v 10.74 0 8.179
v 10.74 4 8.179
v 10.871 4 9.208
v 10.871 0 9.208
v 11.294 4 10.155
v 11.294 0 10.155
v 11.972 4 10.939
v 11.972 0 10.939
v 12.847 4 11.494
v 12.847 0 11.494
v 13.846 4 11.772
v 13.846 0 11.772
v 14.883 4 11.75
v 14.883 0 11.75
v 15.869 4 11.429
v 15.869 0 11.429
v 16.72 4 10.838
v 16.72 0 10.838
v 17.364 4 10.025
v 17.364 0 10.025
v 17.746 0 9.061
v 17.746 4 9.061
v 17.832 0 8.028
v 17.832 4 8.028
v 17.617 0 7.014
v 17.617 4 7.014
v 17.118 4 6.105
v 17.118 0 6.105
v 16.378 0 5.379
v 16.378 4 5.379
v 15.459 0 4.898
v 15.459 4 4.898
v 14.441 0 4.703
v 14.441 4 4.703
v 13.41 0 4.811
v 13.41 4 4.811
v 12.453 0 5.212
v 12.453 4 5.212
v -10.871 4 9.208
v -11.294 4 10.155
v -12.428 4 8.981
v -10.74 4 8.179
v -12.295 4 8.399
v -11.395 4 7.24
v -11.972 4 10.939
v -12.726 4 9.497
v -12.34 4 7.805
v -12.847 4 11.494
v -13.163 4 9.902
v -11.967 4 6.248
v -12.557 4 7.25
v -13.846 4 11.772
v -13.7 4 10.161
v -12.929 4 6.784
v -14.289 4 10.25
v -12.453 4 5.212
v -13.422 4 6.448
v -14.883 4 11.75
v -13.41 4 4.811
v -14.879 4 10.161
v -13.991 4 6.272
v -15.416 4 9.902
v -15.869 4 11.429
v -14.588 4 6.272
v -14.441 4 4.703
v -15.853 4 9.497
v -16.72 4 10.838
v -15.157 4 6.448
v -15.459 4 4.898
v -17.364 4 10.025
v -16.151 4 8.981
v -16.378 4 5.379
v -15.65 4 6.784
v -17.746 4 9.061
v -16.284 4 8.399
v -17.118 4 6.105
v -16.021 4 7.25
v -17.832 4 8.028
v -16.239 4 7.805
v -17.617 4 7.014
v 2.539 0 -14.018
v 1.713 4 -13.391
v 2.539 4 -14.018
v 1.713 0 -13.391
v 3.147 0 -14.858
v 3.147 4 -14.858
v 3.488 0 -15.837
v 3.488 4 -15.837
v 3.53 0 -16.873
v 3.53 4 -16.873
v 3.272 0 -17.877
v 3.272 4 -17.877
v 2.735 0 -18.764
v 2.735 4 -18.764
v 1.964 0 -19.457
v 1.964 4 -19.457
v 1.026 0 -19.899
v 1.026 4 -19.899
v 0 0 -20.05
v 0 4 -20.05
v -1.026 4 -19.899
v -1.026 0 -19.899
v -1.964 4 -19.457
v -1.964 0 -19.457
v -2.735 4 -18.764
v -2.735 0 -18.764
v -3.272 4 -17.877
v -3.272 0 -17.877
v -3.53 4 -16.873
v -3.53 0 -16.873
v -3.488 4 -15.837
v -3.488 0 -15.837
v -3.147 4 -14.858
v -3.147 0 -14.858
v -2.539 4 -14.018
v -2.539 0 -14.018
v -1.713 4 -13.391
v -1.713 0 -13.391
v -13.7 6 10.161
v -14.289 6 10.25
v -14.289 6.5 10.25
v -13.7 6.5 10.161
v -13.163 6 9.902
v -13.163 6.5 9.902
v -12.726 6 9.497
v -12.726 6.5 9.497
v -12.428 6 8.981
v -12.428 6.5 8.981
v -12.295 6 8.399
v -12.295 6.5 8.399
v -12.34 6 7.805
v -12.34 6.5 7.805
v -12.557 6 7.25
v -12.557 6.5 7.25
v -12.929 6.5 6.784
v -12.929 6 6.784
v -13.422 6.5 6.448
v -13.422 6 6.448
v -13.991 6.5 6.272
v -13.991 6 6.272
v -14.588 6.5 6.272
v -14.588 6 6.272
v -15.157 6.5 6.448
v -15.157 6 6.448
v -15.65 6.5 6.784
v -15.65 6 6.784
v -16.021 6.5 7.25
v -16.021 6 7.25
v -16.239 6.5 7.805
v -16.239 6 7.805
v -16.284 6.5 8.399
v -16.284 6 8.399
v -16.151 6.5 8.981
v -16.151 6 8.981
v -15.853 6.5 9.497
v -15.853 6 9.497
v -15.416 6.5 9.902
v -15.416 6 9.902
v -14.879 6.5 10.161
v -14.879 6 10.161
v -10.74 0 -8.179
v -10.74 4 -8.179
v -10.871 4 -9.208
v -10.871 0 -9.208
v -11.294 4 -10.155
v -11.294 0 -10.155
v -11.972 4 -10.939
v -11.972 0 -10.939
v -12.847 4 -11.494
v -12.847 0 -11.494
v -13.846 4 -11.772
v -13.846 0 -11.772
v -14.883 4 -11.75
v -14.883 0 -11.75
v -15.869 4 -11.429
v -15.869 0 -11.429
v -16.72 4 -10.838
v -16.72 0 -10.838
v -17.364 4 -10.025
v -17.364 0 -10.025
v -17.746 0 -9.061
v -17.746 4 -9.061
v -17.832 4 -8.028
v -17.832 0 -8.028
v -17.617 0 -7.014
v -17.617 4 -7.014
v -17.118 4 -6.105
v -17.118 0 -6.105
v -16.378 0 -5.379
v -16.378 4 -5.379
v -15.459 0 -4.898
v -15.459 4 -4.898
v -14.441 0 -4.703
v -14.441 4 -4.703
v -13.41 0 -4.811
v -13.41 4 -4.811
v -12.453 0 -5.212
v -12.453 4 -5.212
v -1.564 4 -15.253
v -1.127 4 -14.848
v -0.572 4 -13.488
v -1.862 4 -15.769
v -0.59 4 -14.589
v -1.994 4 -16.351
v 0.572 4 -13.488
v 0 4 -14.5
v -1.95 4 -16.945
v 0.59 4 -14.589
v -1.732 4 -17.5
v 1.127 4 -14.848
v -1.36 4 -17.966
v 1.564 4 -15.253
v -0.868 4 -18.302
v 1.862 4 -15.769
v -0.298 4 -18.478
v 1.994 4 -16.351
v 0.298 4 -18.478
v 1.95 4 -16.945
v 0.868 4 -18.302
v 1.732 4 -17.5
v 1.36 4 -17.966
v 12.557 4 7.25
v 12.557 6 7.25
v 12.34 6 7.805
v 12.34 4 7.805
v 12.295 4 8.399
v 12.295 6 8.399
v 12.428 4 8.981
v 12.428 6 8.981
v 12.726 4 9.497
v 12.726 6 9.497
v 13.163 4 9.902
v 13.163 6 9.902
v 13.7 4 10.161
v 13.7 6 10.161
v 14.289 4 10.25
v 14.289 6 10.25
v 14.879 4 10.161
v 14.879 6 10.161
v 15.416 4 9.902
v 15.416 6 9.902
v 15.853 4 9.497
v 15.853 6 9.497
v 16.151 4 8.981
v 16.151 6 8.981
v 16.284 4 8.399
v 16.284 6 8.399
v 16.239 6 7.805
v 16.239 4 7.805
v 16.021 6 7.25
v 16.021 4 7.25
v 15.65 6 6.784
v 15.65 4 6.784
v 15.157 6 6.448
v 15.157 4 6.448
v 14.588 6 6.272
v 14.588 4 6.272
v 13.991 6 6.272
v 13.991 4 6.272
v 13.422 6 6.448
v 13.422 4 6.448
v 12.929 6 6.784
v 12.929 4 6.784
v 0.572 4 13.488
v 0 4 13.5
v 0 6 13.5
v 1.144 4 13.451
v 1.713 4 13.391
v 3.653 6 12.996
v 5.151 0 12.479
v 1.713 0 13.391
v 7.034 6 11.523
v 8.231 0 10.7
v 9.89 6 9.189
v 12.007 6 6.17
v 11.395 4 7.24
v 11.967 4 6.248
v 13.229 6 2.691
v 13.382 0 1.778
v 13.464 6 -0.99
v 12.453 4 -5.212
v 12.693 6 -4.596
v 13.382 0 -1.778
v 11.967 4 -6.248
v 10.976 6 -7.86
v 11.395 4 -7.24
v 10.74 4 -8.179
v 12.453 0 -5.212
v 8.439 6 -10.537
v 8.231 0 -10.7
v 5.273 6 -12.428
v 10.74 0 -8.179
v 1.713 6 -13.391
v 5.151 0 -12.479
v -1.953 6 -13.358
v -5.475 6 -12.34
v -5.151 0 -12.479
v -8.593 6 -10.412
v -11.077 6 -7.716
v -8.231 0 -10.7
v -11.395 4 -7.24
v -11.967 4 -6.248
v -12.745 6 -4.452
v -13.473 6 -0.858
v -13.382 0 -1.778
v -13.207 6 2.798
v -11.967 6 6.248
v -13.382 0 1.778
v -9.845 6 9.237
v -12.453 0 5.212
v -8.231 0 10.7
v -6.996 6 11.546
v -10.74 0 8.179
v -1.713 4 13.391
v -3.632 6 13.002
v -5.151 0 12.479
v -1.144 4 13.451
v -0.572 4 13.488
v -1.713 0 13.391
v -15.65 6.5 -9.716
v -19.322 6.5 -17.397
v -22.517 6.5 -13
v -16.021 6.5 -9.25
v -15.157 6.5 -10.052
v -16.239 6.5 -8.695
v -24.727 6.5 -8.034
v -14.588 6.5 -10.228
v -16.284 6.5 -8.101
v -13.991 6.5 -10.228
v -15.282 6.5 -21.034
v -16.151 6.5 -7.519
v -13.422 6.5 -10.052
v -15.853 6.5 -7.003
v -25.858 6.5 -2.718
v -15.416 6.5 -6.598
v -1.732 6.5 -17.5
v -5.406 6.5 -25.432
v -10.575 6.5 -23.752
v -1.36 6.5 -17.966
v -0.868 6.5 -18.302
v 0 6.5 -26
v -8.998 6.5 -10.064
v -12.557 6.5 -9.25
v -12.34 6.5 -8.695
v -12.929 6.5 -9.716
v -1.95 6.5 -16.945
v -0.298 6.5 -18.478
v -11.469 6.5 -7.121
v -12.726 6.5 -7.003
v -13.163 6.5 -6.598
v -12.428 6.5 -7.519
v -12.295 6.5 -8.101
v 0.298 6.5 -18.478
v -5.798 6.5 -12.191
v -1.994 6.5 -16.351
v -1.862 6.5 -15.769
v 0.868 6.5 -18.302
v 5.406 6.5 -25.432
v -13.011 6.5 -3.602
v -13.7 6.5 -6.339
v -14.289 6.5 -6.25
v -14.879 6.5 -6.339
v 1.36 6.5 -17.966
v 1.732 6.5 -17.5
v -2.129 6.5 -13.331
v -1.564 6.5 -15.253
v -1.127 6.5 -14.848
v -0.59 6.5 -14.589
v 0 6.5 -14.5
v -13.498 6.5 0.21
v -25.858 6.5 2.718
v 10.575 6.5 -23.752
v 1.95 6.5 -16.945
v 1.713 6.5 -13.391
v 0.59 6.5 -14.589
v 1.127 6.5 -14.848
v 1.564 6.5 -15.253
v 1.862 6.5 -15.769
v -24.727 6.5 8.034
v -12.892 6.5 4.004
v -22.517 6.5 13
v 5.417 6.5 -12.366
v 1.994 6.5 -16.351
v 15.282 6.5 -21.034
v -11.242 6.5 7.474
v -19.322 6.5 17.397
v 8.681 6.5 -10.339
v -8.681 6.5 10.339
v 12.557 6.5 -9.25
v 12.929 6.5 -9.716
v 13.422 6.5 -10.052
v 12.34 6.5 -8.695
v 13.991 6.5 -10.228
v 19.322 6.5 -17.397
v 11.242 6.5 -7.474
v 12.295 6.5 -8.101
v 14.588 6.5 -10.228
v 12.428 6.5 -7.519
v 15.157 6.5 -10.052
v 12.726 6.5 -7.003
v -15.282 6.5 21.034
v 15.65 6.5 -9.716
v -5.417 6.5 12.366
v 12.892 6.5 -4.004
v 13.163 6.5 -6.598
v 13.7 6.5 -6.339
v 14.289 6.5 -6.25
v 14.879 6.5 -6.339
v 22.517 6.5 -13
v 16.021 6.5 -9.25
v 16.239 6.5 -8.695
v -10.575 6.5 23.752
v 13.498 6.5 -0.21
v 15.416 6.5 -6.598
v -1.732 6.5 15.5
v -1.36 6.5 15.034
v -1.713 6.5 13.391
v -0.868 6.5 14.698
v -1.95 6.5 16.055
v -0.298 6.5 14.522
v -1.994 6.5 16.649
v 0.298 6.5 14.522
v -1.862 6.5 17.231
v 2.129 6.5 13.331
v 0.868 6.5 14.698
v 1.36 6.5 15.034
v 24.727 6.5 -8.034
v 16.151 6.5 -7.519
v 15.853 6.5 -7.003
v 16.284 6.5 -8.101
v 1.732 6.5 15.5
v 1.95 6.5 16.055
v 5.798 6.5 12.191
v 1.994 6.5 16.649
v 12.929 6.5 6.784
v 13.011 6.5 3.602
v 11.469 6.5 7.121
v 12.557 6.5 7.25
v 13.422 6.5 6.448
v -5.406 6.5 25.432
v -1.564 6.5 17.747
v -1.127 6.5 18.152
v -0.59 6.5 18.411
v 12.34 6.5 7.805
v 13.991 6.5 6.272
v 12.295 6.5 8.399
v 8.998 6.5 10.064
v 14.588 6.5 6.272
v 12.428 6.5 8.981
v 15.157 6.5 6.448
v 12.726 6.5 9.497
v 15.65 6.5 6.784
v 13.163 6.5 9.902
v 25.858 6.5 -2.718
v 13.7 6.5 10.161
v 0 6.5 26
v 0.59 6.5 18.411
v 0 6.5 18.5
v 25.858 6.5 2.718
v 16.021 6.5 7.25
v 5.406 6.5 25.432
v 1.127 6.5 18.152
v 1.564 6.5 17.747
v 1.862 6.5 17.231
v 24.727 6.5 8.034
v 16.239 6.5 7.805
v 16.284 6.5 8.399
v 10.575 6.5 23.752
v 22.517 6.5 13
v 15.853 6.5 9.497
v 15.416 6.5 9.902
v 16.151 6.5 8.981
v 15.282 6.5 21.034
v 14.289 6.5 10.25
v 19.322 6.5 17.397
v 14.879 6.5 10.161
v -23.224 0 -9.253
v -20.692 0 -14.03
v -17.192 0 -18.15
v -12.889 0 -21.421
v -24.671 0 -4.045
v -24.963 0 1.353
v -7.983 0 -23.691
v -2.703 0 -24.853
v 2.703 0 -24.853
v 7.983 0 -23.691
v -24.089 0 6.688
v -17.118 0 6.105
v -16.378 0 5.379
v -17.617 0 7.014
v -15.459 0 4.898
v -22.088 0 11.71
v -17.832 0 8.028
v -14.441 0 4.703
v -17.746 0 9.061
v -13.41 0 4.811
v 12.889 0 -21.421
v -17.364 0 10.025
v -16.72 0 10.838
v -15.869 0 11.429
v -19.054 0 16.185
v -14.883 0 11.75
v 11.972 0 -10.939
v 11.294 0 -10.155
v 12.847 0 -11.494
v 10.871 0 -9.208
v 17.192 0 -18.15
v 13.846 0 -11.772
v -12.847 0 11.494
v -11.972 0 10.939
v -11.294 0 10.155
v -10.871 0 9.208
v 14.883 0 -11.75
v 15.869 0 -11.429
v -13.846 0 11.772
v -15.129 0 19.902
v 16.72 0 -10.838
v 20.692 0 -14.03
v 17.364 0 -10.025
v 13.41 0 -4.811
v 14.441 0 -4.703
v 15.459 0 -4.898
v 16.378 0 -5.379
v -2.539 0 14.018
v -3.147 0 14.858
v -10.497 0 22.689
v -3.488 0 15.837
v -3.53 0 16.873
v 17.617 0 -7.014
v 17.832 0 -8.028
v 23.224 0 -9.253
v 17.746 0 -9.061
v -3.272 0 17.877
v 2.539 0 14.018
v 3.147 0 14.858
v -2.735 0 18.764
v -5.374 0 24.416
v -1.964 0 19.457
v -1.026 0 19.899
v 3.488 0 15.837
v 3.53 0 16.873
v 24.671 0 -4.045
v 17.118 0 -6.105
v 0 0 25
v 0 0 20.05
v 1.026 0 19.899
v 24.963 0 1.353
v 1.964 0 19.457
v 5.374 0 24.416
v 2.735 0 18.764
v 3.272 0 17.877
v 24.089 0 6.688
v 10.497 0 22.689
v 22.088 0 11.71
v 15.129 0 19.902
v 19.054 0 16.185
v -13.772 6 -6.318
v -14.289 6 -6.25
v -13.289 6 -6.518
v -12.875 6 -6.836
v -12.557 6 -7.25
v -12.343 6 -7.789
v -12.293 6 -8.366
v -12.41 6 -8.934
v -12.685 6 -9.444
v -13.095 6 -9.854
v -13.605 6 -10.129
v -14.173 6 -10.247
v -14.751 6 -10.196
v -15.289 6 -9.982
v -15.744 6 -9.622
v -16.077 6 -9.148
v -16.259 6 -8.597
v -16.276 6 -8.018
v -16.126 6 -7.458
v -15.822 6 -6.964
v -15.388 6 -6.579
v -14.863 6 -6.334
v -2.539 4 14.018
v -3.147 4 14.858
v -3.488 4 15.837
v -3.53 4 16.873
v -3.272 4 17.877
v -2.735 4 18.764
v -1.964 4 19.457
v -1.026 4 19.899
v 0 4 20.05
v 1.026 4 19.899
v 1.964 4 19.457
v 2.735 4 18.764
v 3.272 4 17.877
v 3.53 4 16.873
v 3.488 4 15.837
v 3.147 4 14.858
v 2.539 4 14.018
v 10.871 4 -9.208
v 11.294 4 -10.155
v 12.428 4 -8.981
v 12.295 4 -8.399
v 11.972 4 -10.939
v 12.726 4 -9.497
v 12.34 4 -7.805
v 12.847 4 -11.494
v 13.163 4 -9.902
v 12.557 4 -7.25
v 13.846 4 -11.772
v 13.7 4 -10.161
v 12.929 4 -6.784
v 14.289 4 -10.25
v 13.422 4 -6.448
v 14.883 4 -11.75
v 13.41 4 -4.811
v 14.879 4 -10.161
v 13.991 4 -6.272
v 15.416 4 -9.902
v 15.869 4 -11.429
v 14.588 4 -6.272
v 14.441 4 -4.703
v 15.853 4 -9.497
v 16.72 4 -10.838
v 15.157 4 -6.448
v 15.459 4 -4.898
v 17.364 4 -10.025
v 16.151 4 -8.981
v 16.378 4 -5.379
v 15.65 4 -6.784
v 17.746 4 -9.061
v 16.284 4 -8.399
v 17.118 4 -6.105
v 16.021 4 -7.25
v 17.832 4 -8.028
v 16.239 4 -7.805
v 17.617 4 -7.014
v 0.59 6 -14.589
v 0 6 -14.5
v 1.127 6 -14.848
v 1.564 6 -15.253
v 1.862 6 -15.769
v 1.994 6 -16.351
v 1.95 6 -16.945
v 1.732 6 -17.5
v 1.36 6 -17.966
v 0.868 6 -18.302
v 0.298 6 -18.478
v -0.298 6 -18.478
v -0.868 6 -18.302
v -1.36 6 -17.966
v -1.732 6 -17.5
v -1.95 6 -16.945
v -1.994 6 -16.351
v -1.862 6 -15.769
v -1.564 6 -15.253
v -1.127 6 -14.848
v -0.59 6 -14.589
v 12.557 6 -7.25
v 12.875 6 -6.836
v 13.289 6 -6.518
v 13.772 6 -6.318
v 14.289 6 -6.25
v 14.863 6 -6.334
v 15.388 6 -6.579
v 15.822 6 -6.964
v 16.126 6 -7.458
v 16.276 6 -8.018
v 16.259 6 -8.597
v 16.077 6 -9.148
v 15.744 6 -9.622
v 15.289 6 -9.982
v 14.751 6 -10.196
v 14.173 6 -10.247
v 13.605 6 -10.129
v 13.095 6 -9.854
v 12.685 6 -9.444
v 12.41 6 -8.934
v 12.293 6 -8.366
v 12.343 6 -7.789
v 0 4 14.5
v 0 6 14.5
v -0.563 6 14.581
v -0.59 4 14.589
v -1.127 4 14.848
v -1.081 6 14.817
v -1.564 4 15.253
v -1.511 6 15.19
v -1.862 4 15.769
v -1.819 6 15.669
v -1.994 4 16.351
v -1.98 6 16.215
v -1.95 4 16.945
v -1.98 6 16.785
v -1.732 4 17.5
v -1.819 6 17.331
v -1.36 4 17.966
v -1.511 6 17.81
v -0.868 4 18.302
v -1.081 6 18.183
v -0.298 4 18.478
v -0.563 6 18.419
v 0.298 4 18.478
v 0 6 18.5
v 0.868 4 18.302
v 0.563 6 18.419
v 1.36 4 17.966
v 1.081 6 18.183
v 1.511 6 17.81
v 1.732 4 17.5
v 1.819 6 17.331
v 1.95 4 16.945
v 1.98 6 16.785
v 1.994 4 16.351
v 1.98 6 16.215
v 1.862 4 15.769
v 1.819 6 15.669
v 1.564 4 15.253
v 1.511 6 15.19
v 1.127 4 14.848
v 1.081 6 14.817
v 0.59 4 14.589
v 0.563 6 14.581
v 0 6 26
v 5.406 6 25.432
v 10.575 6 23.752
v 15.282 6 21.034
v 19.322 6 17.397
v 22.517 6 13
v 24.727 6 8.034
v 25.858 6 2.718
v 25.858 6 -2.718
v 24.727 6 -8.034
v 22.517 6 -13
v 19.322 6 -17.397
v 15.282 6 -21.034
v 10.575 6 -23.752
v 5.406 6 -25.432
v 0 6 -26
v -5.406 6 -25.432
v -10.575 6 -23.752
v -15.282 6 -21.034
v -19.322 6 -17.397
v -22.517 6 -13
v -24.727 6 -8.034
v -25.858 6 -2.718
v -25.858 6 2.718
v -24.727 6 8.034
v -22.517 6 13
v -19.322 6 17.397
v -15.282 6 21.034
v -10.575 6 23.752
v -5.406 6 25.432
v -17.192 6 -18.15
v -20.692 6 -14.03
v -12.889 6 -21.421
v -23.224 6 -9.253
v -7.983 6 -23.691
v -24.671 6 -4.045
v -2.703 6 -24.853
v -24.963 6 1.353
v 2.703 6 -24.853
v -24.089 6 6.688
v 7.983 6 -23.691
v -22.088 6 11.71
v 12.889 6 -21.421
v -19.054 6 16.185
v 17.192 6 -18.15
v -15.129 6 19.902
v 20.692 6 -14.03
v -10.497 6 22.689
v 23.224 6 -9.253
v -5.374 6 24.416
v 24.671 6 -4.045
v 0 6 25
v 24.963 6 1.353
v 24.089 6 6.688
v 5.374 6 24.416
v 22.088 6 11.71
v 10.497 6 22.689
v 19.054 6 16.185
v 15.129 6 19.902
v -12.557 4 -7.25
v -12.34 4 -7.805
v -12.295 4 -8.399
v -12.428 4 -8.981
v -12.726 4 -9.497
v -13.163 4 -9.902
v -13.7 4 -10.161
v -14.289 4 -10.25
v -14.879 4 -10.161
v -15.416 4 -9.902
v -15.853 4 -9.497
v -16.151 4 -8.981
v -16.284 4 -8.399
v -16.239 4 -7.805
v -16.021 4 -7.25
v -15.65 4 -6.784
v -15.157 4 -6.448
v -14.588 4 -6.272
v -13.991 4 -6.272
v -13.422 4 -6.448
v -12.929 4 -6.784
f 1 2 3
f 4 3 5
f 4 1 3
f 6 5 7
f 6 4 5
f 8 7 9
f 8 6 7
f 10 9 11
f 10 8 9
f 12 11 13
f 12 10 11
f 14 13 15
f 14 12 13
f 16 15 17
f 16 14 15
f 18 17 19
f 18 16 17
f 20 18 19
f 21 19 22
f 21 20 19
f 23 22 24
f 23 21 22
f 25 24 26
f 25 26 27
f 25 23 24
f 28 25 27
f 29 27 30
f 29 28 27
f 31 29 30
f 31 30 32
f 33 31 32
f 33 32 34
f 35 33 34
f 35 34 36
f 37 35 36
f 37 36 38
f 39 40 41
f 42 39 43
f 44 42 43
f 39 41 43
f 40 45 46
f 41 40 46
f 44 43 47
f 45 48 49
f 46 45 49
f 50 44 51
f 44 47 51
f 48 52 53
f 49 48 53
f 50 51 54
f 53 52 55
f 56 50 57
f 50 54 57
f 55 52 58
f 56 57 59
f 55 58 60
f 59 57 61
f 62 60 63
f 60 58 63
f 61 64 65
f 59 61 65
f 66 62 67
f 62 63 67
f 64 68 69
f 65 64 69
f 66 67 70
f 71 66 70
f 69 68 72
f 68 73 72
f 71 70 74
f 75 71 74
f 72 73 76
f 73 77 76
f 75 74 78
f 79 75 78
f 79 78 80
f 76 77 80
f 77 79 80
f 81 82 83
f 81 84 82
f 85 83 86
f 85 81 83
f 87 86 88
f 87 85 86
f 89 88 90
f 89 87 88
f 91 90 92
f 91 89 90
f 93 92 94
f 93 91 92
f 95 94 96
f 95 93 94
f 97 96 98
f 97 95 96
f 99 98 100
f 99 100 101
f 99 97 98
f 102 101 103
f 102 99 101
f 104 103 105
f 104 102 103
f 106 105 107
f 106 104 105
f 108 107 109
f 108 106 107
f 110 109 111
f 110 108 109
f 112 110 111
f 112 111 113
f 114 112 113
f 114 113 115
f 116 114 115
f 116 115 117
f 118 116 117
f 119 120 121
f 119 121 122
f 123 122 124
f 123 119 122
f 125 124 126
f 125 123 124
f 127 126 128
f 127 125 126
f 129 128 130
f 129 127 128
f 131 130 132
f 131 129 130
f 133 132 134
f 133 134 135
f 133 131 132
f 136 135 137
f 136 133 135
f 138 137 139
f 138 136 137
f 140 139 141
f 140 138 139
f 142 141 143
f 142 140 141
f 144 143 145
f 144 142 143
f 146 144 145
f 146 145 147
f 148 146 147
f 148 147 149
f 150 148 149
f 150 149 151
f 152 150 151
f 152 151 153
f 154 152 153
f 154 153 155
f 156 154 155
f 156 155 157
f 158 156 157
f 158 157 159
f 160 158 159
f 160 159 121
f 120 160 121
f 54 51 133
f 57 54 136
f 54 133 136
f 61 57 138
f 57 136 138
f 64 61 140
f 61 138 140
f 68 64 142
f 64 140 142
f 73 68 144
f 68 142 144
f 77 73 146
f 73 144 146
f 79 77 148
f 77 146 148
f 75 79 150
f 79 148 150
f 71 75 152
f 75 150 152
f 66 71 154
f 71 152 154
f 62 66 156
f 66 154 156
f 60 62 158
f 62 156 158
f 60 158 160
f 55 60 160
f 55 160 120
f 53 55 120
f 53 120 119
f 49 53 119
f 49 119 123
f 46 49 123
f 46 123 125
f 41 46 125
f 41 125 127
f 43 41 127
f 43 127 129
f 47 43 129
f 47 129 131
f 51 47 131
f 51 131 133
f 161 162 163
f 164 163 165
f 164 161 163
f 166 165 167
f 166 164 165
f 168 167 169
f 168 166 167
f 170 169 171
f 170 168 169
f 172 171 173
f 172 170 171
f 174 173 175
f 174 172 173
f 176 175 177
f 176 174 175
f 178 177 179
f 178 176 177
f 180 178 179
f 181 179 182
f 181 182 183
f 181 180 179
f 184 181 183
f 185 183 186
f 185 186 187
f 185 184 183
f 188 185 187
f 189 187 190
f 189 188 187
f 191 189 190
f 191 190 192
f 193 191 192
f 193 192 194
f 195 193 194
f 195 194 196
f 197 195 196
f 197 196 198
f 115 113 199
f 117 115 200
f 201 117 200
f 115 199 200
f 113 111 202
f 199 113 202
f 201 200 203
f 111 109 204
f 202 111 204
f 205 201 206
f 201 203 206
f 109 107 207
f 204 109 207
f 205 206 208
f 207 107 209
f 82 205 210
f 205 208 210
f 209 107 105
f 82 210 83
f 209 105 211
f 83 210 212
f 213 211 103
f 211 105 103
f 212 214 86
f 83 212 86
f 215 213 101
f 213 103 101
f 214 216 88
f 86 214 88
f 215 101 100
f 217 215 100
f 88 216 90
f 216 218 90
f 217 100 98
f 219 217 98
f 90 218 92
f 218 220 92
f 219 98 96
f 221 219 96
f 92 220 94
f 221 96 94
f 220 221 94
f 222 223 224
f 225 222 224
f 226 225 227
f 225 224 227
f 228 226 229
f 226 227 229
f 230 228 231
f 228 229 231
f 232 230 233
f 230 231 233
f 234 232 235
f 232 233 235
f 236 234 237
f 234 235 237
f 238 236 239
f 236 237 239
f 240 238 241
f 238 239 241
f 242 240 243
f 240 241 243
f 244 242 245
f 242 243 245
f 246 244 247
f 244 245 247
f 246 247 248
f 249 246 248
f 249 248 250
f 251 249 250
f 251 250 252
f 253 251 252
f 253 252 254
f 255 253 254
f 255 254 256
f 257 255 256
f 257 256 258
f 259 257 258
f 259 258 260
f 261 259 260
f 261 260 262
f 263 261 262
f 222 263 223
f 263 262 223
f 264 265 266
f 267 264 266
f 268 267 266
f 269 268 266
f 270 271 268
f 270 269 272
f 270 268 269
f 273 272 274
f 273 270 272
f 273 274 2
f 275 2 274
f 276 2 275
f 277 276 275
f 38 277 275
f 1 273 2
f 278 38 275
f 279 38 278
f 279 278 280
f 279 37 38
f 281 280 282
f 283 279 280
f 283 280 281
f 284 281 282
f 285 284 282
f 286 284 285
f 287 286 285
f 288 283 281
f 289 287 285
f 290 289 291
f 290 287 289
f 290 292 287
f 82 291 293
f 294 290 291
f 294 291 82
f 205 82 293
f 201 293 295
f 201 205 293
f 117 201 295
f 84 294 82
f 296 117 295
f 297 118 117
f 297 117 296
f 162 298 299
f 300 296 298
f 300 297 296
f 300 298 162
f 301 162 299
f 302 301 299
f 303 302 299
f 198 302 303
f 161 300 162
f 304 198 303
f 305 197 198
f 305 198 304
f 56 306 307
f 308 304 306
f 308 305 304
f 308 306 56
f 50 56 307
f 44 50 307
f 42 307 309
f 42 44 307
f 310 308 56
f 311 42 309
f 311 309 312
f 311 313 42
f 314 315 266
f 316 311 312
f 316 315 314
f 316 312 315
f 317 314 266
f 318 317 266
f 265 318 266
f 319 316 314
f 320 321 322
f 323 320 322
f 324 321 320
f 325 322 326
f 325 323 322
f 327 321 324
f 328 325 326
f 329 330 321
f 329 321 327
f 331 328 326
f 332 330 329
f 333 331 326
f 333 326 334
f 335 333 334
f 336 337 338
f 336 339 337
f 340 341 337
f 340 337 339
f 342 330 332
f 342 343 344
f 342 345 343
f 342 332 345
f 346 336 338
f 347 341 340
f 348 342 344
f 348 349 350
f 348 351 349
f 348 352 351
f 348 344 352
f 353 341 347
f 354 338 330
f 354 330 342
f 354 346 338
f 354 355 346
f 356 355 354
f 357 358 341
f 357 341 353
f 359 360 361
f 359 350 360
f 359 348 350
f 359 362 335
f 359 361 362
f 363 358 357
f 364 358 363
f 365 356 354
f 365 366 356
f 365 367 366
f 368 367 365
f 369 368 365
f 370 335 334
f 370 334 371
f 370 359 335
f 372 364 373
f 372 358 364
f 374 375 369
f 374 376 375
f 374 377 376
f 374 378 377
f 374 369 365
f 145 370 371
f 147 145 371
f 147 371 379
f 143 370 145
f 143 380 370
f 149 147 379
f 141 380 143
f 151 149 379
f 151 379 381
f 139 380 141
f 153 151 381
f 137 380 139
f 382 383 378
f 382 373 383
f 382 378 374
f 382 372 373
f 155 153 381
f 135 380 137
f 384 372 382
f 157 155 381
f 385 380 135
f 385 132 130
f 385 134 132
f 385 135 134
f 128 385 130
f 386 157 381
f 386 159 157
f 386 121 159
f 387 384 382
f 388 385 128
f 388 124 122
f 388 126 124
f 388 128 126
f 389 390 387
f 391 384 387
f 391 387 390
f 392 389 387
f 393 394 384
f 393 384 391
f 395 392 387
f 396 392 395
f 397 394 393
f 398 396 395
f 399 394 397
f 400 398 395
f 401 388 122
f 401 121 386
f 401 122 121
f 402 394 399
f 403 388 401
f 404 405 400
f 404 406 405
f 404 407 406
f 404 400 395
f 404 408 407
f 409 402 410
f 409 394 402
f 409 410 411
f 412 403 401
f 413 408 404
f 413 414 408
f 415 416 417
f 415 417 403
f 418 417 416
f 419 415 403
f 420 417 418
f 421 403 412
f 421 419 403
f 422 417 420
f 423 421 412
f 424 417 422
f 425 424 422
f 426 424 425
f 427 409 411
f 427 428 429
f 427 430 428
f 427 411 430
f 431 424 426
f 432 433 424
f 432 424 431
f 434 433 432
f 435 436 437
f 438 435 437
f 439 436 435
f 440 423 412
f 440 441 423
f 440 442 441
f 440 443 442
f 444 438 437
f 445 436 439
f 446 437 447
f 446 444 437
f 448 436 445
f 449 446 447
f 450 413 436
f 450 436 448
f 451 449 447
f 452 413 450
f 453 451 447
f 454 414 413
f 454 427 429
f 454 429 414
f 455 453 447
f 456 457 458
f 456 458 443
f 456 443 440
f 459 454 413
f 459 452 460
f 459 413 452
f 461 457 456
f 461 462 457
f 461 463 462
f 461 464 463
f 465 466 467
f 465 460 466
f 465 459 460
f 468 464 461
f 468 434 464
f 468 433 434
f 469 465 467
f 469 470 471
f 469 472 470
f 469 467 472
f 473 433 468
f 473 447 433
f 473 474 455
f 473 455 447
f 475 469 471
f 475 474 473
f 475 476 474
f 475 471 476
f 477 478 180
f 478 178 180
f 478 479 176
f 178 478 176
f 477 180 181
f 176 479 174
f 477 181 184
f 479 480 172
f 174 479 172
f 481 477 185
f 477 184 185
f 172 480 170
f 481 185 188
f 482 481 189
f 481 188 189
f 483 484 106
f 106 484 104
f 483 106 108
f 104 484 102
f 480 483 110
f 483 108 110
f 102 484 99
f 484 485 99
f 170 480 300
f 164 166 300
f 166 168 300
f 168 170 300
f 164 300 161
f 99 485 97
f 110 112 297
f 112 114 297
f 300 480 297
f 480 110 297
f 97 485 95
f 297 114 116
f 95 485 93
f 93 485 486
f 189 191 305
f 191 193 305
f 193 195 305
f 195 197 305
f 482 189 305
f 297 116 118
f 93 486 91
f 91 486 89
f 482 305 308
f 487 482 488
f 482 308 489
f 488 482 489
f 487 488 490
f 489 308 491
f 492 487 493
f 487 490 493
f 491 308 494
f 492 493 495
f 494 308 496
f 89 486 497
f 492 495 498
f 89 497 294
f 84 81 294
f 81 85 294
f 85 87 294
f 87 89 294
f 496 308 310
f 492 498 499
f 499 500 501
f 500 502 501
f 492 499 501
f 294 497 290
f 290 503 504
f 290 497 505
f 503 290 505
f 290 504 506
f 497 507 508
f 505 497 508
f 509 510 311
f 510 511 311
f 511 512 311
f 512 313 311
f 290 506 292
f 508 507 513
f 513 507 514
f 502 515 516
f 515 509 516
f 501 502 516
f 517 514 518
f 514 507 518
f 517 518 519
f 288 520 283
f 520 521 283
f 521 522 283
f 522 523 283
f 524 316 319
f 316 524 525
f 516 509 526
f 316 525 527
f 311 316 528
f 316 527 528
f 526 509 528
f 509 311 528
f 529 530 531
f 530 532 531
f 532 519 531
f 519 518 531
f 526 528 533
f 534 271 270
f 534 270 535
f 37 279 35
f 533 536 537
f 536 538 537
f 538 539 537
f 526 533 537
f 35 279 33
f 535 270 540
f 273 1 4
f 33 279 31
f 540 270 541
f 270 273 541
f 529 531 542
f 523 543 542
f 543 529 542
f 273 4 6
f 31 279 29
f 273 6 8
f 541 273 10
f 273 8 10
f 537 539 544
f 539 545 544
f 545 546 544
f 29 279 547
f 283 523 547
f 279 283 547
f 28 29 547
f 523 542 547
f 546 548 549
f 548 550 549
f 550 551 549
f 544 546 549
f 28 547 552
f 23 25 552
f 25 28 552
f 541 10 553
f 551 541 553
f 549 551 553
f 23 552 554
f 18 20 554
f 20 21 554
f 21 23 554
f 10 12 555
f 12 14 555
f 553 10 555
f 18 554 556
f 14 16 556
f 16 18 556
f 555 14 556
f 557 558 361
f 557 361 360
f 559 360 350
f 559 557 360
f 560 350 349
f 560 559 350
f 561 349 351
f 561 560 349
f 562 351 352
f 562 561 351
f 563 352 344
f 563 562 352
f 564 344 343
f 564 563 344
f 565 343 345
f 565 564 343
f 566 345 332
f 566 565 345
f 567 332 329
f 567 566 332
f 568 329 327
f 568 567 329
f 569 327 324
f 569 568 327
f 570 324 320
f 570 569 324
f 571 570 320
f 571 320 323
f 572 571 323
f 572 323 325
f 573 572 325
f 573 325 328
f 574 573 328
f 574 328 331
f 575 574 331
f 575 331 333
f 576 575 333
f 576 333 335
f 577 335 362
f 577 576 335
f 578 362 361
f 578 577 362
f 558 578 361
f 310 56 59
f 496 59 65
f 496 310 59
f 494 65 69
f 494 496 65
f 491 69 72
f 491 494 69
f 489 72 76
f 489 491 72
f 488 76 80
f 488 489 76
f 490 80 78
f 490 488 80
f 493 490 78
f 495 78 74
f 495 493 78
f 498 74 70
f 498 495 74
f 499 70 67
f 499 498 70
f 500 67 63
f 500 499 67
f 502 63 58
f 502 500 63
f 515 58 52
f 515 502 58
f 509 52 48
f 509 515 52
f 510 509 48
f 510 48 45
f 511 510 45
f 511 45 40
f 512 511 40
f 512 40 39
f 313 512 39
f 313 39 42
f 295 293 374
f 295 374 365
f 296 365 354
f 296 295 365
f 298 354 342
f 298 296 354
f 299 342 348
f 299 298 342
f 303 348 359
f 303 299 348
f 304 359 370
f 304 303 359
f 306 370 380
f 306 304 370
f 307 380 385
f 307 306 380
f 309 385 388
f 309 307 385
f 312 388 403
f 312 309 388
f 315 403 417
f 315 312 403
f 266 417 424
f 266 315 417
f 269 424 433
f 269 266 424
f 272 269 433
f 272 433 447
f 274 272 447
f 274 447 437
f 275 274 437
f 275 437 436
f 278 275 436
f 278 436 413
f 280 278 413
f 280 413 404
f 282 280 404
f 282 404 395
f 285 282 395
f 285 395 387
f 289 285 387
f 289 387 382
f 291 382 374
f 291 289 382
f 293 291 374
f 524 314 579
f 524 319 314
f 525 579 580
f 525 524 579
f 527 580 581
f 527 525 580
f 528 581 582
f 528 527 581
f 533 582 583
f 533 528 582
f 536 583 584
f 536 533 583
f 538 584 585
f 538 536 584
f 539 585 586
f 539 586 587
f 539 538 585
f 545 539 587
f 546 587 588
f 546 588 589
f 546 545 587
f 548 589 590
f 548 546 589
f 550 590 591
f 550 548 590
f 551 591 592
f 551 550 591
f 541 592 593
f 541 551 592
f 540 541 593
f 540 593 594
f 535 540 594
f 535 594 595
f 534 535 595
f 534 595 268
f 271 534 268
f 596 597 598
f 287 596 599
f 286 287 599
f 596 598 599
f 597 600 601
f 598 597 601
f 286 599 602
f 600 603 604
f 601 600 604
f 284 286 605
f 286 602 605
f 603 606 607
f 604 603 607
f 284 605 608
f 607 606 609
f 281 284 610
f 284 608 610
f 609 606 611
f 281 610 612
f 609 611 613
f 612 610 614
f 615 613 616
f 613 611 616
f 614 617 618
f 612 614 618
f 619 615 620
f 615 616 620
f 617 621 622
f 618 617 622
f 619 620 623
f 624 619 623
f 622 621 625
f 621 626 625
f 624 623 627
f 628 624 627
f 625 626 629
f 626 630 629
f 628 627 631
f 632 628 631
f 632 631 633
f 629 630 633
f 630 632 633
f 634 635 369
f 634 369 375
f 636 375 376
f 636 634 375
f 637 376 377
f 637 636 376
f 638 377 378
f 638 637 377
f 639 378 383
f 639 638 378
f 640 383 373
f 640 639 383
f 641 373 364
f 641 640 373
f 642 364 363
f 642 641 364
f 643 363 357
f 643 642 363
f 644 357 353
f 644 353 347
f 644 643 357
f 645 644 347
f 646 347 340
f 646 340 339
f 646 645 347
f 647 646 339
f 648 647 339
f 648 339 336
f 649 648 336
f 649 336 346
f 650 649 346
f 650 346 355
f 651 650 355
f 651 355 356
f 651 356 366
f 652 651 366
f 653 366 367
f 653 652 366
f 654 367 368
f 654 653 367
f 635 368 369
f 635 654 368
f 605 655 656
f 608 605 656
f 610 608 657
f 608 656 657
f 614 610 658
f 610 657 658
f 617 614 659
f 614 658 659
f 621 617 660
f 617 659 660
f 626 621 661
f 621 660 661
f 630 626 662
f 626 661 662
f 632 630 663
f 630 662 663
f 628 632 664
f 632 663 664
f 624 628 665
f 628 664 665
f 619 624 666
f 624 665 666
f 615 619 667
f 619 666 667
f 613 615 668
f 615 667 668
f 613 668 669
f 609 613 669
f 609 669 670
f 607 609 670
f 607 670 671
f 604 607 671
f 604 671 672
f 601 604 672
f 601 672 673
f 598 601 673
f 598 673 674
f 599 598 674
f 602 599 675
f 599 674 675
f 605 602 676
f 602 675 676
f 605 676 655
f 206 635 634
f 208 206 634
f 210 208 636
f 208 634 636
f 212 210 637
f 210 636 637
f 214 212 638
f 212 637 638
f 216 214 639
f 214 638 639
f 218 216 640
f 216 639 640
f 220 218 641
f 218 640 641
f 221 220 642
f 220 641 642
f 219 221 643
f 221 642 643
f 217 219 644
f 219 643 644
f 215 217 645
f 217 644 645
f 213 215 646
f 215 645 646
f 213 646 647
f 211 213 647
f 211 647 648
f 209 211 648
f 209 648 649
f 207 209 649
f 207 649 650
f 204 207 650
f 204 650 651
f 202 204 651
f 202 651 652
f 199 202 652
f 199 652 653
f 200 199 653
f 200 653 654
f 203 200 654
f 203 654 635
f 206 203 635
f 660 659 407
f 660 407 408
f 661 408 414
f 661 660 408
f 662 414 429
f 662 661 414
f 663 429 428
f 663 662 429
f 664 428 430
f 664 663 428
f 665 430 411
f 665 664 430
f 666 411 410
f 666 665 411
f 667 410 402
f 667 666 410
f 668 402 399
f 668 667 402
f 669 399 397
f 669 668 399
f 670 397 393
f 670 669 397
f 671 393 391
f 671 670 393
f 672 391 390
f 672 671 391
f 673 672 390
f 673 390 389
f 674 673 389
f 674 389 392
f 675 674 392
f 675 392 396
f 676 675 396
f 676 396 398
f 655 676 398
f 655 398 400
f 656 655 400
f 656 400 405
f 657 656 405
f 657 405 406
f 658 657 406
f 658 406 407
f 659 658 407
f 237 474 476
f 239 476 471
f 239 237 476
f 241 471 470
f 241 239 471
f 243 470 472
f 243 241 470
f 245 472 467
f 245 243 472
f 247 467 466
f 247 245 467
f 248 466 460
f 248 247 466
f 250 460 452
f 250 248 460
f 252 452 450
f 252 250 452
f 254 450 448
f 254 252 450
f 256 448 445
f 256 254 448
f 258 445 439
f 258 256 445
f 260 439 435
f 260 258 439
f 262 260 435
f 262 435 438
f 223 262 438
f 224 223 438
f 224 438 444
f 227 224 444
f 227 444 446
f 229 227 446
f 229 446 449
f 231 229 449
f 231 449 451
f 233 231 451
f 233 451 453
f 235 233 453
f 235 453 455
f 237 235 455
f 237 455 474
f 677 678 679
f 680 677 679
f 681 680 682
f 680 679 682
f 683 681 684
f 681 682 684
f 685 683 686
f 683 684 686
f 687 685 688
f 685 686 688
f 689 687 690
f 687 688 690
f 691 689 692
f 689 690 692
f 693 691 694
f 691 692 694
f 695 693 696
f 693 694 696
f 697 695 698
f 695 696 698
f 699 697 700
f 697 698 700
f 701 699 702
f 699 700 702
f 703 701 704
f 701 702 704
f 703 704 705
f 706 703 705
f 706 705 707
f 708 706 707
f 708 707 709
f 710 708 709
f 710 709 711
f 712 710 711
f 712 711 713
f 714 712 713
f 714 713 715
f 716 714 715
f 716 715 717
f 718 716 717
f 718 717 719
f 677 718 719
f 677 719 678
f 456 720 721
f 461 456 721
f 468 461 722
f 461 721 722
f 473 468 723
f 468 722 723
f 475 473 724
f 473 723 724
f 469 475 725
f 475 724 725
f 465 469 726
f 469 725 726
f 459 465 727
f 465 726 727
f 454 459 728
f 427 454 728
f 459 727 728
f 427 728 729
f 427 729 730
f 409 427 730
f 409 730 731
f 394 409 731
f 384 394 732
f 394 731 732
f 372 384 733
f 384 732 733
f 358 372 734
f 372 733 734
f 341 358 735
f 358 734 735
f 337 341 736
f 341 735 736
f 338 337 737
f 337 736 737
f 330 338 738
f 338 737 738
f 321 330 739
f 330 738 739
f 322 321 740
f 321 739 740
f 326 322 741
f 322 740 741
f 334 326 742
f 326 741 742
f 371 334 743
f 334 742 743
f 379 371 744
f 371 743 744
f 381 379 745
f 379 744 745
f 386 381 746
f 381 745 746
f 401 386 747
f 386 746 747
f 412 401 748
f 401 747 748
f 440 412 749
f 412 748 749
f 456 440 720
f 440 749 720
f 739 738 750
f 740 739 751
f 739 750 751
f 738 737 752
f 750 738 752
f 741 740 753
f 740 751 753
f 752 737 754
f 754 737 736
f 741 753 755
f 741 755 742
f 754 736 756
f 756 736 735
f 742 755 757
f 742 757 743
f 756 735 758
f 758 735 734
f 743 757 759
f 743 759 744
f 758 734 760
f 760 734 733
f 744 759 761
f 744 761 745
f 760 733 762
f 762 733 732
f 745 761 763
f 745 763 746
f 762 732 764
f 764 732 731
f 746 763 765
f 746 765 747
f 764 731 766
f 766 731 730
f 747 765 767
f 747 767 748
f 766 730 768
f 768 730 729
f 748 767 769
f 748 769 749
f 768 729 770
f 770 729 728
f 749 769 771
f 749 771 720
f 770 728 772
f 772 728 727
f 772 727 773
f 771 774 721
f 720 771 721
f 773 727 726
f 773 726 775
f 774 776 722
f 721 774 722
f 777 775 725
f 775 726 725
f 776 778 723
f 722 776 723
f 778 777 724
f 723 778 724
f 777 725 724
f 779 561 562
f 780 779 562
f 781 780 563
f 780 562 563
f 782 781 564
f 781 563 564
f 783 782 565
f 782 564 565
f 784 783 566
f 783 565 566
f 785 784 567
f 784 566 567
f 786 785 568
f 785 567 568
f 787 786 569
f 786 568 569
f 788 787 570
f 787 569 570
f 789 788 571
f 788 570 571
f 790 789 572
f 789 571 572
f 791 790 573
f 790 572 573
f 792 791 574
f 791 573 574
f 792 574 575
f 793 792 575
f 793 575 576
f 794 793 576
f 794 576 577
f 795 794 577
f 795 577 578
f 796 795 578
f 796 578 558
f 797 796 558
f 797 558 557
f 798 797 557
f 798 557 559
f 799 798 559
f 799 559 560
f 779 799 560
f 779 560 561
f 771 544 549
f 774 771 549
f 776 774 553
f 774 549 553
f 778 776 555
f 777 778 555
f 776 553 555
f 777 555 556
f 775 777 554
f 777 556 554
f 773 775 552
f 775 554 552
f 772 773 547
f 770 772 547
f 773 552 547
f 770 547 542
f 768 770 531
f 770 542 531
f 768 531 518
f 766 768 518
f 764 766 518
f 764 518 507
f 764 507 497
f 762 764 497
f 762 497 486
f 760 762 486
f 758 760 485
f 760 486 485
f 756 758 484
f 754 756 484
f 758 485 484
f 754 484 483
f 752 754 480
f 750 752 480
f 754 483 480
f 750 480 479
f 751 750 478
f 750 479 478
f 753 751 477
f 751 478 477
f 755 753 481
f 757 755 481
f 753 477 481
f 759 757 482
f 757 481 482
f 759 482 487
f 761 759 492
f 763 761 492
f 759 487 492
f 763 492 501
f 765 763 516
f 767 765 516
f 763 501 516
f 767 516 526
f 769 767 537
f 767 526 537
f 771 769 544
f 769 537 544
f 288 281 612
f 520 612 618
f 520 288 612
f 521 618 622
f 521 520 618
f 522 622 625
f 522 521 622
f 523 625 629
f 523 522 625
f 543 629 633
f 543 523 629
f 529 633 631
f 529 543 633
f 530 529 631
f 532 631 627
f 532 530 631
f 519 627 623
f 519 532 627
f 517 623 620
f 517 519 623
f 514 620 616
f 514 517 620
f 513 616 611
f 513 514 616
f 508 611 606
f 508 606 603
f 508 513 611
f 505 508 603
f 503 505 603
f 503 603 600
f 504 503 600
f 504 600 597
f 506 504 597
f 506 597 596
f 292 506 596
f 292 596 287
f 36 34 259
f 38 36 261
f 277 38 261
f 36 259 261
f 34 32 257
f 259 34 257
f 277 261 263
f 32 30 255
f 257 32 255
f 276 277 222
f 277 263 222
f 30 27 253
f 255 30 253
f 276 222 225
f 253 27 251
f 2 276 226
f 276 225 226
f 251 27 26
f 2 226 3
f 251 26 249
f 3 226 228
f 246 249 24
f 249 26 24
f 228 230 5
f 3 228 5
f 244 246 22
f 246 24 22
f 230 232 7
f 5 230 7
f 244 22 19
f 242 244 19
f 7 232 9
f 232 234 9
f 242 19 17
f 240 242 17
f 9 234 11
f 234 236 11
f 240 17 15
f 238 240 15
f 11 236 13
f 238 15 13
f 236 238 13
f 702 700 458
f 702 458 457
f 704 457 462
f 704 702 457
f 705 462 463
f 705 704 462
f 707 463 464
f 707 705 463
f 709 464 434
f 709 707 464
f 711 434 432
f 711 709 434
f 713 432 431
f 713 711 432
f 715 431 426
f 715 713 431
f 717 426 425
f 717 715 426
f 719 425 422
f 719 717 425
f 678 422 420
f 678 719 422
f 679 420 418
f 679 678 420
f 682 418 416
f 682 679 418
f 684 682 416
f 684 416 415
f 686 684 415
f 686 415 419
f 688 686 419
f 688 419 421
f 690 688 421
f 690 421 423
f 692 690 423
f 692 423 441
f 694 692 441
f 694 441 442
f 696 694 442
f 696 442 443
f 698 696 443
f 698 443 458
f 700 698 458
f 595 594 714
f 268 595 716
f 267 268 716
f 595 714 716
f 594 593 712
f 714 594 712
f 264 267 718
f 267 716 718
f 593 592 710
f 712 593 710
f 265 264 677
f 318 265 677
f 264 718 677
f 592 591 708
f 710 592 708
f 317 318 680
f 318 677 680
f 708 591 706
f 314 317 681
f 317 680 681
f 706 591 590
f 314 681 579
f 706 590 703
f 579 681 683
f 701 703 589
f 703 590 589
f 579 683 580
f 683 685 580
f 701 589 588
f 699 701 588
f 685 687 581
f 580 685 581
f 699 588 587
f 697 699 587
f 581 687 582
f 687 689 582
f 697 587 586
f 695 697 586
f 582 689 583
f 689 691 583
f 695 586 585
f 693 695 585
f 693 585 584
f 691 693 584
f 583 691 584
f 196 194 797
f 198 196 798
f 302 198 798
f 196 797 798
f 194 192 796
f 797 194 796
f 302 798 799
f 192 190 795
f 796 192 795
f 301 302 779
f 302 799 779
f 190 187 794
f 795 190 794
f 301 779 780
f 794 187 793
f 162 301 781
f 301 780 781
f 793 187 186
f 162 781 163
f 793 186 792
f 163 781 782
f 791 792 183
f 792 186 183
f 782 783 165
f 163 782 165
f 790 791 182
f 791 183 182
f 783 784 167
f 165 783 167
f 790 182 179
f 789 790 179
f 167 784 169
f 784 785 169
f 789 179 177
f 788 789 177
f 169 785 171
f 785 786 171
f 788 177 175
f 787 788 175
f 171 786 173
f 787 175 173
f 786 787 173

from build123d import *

# Parameters (mm, degrees)
SKETCH1_R           = 25
SKETCH1_R_2         = 13.5
BOSS_EXTRUDE1_DEPTH = 6
SKETCH2_R           = 2
CUT_EXTRUDE1_DEPTH  = 36.860842154
SKETCH3_R           = 3.55
CUT_EXTRUDE4_DEPTH  = 4
CIRPATTERN2_COUNT   = 6
SKETCH4_R           = 26
SKETCH4_R_2         = 2
SKETCH4_R_3         = 13.5
BOSS_EXTRUDE3_DEPTH = 0.5


with BuildPart() as part:
    # Sketch1 → Boss-Extrude1 (new body)
    with BuildSketch(Plane(origin=(0, 0, 0), x_dir=(1, 0, 0), z_dir=(0, 1, 0))):
        with Locations(Location((0, 0, 0), (0, 0, 270))):
            Circle(SKETCH1_R)
        with Locations(Location((0, 0, 0), (0, 0, 270))):
            Circle(SKETCH1_R_2, mode=Mode.SUBTRACT)
    extrude(amount=BOSS_EXTRUDE1_DEPTH)

    # Sketch2 → Cut-Extrude1 (cut, through all)
    with BuildSketch(Plane(origin=(0, 6, 0), x_dir=(1, 0, 0), z_dir=(0, 1, 0))):
        with Locations(Location((0, 16.5, 0), (0, 0, 270))):
            Circle(SKETCH2_R)
    cut_extrude1 = extrude(amount=-CUT_EXTRUDE1_DEPTH, mode=Mode.SUBTRACT)

    # Sketch3 → Cut-Extrude4 (cut)
    with BuildSketch(Plane(origin=(0, 0, 0), x_dir=(1, 0, 0), z_dir=(0, 1, 0))):
        with Locations((0, 16.5)):
            Circle(SKETCH3_R)
    cut_extrude4 = extrude(amount=CUT_EXTRUDE4_DEPTH, mode=Mode.SUBTRACT)

    # CirPattern2: Cut-Extrude1, Cut-Extrude4 ×6 about axis
    cirpattern2_axis = Axis((0, 0, 0), (0, 1, 0))
    add([cut_extrude1.rotate(cirpattern2_axis, i * 360 / CIRPATTERN2_COUNT) for i in range(1, CIRPATTERN2_COUNT)], mode=Mode.SUBTRACT)
    add([cut_extrude4.rotate(cirpattern2_axis, i * 360 / CIRPATTERN2_COUNT) for i in range(1, CIRPATTERN2_COUNT)], mode=Mode.SUBTRACT)

    # Sketch4 → Boss-Extrude3 (add)
    with BuildSketch(Plane(origin=(0, 6, 0), x_dir=(1, 0, 0), z_dir=(0, 1, 0))):
        with Locations(Location((0, 0, 0), (0, 0, 270))):
            Circle(SKETCH4_R)
        with Locations(Location((14.289419162, 8.25, 0), (0, 0, 270))):
            Circle(SKETCH4_R_2, mode=Mode.SUBTRACT)
        with Locations(Location((14.289419162, -8.25, 0), (0, 0, 270))):
            Circle(SKETCH4_R_2, mode=Mode.SUBTRACT)
        with Locations(Location((0, -16.5, 0), (0, 0, 270))):
            Circle(SKETCH4_R_2, mode=Mode.SUBTRACT)
        with Locations(Location((0, 0, 0), (0, 0, 82.708634602))):
            Circle(SKETCH4_R_3, mode=Mode.SUBTRACT)
        with Locations(Location((-14.289419162, -8.25, 0), (0, 0, 270))):
            Circle(SKETCH4_R_2, mode=Mode.SUBTRACT)
        with Locations(Location((-14.289419162, 8.25, 0), (0, 0, 270))):
            Circle(SKETCH4_R_2, mode=Mode.SUBTRACT)
        with Locations(Location((0, 16.5, 0), (0, 0, 270))):
            Circle(SKETCH4_R_2, mode=Mode.SUBTRACT)
    extrude(amount=BOSS_EXTRUDE3_DEPTH)


solid = part.part
